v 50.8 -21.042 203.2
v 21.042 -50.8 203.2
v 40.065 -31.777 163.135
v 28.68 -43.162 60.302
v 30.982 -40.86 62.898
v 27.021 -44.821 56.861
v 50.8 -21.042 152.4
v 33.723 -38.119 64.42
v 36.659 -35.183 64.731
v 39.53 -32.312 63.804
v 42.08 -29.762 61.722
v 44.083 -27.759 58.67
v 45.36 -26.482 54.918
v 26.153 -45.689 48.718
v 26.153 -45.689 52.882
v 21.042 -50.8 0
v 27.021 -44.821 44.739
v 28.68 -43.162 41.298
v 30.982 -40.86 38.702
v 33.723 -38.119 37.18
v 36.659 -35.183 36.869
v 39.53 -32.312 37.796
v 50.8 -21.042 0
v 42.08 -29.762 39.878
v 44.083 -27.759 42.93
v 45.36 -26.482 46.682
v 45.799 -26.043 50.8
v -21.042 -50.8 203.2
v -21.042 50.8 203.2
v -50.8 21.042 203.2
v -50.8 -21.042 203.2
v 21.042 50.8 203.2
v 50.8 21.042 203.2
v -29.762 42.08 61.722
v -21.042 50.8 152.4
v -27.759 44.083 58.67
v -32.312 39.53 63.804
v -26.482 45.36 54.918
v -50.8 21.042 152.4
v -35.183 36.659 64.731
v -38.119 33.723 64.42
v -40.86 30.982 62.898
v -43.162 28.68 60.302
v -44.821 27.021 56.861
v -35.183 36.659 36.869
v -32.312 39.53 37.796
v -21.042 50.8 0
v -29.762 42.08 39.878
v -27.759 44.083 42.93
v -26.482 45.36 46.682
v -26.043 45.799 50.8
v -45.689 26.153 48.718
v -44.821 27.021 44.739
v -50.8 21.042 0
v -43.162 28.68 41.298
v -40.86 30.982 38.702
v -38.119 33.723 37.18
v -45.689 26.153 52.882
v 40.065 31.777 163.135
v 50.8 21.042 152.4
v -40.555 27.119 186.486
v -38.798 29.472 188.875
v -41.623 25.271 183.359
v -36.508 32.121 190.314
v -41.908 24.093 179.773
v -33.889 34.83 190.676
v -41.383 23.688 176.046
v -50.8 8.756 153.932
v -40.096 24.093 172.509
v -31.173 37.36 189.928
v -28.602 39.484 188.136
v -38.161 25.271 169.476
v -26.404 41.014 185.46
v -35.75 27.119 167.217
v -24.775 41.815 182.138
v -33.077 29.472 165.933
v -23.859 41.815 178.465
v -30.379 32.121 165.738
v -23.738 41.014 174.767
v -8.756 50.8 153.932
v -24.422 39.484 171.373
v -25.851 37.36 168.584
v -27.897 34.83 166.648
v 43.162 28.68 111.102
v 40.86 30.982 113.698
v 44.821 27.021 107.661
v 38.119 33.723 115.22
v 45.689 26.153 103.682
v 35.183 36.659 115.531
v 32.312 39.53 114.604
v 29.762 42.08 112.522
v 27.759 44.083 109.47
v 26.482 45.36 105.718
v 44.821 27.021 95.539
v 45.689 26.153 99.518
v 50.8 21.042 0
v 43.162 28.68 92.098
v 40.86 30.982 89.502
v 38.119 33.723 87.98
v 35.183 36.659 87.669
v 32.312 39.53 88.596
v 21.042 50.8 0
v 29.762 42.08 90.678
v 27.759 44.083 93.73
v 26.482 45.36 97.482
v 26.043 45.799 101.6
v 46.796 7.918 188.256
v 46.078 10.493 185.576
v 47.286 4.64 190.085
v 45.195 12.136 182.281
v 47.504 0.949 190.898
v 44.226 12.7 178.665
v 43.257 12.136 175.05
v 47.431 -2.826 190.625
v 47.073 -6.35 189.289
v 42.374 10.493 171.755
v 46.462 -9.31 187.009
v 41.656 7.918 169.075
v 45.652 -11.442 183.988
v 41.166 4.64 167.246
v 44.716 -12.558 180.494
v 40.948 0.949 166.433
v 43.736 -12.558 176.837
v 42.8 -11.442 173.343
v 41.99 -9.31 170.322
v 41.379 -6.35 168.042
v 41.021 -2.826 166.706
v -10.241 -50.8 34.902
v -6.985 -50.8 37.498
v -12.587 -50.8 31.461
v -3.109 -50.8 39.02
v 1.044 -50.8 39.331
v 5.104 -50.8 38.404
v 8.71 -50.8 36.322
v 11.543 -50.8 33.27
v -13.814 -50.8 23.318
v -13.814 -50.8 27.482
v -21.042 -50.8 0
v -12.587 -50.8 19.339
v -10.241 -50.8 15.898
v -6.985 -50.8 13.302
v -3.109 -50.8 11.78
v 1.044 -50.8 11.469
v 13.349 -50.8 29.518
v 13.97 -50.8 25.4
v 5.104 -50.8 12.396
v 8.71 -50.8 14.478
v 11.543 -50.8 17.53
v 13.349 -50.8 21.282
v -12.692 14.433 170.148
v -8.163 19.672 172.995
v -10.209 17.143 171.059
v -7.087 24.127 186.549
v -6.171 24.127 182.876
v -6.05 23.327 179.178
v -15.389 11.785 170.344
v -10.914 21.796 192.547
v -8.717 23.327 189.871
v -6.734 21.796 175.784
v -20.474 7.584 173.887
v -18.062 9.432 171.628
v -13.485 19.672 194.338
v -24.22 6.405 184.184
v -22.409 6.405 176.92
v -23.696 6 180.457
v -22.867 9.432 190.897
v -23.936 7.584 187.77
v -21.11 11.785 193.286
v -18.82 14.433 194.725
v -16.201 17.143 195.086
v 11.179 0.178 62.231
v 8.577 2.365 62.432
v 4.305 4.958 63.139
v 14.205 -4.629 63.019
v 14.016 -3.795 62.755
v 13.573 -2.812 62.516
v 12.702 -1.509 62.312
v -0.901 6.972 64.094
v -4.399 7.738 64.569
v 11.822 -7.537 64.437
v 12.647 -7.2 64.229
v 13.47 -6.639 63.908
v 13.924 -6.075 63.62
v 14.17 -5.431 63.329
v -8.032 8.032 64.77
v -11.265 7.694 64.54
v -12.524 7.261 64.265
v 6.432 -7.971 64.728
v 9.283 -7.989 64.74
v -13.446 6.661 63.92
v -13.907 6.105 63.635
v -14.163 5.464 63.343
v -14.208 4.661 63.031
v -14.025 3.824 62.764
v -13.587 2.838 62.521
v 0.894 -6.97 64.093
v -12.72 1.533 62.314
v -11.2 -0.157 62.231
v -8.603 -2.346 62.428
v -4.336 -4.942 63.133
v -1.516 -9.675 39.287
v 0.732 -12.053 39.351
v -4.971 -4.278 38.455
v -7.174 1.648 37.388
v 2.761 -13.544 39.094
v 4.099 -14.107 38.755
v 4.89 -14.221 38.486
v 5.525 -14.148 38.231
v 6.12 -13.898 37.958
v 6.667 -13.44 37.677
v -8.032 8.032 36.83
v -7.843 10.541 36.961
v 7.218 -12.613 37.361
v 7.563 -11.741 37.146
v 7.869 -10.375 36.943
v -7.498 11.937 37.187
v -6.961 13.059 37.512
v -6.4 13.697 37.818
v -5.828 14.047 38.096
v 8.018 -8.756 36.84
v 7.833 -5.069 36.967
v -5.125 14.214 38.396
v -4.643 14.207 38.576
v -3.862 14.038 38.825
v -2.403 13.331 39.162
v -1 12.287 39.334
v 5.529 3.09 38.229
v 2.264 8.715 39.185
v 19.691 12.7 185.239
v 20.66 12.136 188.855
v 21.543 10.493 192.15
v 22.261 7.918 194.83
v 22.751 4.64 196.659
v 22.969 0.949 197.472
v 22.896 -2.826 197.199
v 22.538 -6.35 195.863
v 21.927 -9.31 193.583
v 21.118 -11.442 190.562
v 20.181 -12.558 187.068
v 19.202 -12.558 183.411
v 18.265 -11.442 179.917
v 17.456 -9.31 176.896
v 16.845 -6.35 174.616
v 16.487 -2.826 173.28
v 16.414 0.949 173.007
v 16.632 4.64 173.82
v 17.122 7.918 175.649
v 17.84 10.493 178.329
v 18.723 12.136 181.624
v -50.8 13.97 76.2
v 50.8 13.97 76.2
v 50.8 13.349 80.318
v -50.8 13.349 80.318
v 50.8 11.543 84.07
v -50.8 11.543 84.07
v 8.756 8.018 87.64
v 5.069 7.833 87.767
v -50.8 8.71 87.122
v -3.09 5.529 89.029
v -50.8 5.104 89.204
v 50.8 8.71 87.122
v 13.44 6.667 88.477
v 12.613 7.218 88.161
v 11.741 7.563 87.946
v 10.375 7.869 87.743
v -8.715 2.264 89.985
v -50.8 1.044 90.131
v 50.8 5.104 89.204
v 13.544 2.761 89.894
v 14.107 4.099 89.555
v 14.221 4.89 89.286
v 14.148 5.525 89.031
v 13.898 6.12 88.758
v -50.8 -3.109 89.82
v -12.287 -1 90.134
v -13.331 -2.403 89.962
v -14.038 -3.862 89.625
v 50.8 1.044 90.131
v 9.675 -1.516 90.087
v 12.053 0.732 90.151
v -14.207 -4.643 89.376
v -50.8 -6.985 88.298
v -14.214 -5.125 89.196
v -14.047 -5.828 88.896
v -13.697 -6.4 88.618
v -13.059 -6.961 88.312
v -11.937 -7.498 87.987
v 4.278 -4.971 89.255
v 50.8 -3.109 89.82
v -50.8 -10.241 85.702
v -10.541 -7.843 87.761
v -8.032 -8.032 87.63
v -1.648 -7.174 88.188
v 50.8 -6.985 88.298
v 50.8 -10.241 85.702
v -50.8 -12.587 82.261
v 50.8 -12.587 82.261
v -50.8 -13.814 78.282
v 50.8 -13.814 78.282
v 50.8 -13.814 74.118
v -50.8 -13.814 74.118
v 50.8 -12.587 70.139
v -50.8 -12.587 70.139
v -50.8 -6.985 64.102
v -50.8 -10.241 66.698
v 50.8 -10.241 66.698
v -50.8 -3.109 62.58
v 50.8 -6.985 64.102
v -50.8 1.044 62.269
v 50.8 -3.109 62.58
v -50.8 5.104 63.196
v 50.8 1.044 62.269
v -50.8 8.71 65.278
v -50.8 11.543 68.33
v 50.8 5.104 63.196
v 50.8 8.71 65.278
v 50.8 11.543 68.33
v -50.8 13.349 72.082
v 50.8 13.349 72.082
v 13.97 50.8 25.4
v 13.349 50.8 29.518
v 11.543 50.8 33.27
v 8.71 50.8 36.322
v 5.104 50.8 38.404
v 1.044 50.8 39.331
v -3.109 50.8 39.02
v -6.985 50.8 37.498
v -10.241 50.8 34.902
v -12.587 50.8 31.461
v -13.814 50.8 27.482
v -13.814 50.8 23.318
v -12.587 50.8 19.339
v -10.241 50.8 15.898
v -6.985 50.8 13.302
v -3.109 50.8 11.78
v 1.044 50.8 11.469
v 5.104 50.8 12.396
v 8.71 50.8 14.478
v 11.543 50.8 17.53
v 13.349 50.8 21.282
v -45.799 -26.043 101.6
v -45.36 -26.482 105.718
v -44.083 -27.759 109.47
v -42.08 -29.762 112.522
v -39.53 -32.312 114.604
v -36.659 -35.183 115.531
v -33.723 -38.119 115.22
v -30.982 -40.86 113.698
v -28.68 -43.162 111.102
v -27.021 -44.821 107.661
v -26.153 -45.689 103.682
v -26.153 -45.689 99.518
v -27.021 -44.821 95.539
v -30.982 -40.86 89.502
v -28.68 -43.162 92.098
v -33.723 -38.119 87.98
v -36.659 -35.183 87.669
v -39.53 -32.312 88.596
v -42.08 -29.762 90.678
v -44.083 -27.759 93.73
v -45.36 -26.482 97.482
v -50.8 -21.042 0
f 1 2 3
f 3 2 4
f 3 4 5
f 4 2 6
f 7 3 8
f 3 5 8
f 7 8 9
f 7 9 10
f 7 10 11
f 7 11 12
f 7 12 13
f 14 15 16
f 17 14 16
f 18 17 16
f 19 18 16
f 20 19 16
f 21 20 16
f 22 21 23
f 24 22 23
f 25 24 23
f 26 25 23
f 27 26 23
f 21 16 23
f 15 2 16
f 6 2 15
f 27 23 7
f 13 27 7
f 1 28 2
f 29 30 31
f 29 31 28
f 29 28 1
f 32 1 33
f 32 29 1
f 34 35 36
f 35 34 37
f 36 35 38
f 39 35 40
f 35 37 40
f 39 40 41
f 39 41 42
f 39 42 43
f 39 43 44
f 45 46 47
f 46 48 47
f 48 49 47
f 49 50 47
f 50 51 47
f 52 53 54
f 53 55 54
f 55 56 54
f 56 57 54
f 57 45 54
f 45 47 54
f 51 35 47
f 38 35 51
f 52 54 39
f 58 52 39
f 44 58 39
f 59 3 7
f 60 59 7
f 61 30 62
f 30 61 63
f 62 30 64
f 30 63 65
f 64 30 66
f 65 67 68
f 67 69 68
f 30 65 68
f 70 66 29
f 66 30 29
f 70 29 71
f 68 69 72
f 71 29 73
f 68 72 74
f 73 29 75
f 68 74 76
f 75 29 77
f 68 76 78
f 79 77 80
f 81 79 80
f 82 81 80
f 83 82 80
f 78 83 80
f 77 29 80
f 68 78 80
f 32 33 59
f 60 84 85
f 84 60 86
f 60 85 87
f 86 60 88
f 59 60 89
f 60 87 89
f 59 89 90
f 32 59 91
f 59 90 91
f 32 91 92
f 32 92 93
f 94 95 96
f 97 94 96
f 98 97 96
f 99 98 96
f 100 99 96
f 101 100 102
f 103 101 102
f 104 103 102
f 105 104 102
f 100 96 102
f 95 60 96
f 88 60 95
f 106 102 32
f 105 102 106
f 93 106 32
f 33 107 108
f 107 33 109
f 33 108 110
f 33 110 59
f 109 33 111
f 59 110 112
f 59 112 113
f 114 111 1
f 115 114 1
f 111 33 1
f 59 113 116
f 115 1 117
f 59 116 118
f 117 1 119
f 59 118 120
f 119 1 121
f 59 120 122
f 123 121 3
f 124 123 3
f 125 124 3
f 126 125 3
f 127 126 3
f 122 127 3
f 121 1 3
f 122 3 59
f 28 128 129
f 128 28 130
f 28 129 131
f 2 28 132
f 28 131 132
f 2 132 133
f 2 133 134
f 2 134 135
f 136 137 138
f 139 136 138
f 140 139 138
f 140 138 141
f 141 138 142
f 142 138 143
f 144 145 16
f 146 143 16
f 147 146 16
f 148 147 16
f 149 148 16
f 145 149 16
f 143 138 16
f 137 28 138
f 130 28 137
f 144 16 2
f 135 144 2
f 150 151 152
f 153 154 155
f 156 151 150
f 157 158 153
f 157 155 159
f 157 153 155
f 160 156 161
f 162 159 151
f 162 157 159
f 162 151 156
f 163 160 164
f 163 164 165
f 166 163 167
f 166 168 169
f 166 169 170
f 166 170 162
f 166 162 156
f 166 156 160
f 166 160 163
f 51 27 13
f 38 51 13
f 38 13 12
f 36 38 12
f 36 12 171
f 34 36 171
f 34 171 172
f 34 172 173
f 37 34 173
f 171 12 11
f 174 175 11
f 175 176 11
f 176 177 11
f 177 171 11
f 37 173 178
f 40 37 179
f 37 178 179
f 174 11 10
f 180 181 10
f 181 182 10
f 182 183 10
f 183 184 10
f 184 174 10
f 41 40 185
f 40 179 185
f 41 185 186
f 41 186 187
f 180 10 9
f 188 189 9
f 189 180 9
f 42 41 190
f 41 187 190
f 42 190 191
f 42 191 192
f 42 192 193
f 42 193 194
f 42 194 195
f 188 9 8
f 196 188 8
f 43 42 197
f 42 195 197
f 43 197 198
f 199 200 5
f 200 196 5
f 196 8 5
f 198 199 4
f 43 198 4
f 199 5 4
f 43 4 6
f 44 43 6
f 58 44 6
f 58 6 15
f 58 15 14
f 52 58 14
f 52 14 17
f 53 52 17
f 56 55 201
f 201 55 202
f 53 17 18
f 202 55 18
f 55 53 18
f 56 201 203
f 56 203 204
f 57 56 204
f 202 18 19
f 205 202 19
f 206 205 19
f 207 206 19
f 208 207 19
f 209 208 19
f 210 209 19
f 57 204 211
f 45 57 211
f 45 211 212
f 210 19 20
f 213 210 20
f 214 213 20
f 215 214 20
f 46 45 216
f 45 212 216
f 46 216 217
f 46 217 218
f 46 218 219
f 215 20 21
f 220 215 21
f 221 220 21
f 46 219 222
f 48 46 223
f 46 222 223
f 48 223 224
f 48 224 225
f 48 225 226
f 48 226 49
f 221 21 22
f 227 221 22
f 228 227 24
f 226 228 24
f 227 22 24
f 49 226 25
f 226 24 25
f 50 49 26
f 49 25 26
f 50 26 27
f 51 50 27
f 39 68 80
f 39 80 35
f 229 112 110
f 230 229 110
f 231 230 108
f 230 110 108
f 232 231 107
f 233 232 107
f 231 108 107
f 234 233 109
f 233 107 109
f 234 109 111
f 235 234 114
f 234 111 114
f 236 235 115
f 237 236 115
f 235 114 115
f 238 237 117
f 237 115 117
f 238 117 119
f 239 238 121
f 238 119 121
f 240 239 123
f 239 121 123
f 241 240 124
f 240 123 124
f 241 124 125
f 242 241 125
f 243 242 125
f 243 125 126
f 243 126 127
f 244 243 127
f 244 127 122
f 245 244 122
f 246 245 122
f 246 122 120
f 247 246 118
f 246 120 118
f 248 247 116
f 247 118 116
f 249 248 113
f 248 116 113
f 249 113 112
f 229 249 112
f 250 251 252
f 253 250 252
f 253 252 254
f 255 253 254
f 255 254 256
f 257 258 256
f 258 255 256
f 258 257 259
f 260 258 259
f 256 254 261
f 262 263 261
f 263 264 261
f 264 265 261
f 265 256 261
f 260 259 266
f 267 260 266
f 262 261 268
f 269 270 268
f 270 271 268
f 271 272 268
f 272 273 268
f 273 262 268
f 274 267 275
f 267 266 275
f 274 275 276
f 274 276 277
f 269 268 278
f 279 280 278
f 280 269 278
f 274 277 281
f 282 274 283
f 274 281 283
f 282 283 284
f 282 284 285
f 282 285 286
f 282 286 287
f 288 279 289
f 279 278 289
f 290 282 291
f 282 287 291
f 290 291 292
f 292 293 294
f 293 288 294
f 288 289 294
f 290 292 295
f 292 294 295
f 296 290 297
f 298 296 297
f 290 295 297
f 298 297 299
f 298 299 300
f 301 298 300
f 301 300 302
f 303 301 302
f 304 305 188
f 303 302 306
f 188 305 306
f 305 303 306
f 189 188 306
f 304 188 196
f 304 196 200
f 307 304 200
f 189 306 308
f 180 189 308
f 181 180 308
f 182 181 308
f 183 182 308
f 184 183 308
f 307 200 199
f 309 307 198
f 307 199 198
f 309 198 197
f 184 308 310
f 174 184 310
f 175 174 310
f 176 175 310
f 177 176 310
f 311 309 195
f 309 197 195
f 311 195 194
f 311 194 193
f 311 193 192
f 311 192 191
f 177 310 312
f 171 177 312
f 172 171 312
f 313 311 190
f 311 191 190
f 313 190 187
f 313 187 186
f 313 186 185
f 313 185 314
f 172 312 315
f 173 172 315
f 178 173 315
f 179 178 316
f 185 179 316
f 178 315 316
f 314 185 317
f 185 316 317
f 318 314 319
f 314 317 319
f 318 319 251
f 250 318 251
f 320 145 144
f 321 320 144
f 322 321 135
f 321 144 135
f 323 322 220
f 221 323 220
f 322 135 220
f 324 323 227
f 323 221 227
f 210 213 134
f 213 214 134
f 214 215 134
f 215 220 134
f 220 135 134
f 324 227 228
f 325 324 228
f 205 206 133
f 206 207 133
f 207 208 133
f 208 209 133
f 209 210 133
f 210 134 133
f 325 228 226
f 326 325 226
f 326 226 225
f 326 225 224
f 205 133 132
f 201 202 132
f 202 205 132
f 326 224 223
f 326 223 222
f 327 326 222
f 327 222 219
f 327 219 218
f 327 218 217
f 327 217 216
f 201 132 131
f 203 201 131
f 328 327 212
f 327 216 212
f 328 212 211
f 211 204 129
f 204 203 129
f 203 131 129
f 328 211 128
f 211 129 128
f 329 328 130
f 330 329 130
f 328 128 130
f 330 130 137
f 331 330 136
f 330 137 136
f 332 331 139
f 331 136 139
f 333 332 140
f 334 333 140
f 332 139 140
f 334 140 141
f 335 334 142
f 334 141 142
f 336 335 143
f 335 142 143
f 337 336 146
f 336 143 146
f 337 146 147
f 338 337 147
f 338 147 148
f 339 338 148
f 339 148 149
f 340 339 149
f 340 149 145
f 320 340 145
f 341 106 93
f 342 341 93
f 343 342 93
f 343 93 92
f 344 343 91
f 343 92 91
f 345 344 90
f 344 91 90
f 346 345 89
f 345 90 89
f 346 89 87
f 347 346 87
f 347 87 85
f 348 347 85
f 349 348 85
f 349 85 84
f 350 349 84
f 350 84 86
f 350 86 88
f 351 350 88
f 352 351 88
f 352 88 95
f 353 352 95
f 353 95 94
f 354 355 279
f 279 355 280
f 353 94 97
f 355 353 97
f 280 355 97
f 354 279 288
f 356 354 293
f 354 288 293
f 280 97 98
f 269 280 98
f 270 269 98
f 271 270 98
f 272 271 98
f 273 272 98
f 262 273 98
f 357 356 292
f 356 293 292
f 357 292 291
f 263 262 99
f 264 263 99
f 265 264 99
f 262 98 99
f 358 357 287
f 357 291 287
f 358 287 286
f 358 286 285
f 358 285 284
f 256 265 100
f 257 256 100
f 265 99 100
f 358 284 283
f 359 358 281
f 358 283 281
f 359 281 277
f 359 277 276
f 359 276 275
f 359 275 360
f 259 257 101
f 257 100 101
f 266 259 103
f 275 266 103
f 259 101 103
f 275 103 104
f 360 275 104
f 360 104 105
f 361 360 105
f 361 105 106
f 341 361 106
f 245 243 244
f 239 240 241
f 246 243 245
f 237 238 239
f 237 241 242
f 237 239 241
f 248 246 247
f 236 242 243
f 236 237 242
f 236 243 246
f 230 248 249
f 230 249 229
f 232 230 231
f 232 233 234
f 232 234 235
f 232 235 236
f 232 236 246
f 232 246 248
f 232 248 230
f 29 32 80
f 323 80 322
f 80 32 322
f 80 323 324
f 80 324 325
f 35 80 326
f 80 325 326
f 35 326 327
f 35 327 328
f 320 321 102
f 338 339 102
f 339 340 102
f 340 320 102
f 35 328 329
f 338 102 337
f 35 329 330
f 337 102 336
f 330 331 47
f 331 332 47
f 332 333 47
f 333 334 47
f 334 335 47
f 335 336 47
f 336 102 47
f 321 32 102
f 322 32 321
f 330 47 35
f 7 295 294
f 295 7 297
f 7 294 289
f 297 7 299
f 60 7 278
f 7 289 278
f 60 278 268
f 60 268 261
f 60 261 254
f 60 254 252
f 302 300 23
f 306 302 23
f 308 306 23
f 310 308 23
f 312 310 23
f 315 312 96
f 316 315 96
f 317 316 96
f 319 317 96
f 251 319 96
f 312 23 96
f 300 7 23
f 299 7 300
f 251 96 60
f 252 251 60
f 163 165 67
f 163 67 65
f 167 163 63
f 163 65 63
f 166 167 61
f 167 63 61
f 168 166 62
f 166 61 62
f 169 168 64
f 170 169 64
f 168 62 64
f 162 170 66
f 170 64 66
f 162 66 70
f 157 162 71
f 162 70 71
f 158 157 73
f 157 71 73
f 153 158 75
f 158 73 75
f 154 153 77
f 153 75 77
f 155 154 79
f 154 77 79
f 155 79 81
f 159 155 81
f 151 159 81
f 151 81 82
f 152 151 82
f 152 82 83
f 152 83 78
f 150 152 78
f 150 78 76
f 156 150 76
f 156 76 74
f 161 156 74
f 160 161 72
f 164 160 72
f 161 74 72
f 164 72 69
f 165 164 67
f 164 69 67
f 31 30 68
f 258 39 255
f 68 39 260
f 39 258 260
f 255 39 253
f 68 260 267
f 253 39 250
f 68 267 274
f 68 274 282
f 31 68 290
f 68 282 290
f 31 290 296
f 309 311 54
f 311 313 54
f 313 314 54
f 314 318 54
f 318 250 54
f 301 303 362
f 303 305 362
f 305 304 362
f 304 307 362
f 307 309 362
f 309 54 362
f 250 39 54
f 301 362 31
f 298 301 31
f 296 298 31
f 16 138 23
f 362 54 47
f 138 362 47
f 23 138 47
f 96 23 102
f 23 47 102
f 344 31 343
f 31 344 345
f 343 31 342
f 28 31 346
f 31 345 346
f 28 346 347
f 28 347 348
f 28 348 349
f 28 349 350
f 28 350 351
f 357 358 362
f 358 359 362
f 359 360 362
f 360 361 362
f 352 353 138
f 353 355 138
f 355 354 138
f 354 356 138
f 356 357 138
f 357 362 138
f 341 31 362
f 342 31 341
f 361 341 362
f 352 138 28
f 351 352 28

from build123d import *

# Parameters (mm, degrees)
F1_DEPTH  = 203.2
F2_R      = 13.97
F3_DEPTH  = 101.601
F4_R      = 13.97
F5_DEPTH  = 101.6
F6_R      = 13.97
F7_DEPTH  = 101.601
F8_R      = 13.97
F9_DEPTH  = 122.64304911
F11_DEPTH = 101.6010001
F12_R     = 12.7
F13_DEPTH = 25.4
F15_DEPTH = 122.64304911
F16_R     = 12.7
F17_DEPTH = 25.4


with BuildPart() as f1:
    # F0 (on Top) → F1 (new body)
    with BuildSketch(Plane.XY):
        Polygon((-21.0420489686, -50.8), (21.0420489686, -50.8), (50.8, -21.0420489686), (50.8, 21.0420489686), (21.0420489686, 50.8), (-21.0420489686, 50.8), (-50.8, 21.0420489686), (-50.8, -21.0420489686), align=None)
    extrude(amount=F1_DEPTH)

    # F2 (on face) → F3 (cut, through all)
    with BuildSketch(Plane.XZ.offset(50.8)):
        with Locations((0, 25.4)):
            Circle(F2_R)
    extrude(amount=-F3_DEPTH, mode=Mode.SUBTRACT)

    # F4 (on face) → F5 (cut)
    with BuildSketch(Plane(origin=(35.9210244843, -35.9210244843, 0), x_dir=(0.7071067812, 0.7071067812, 0), z_dir=(0.7071067812, -0.7071067812, 0))):
        with Locations((0, 50.8)):
            Circle(F4_R)
    extrude(amount=-F5_DEPTH, mode=Mode.SUBTRACT)

    # F6 (on face) → F7 (cut, through all)
    with BuildSketch(Plane.YZ.offset(50.8)):
        with Locations((0, 76.2)):
            Circle(F6_R)
    extrude(amount=-F7_DEPTH, mode=Mode.SUBTRACT)

    # F8 (on face) → F9 (cut, through all)
    with BuildSketch(Plane(origin=(35.9210244843, 35.9210244843, 0), x_dir=(-0.7071067812, 0.7071067812, 0), z_dir=(0.7071067812, 0.7071067812, 0))):
        with Locations((0, 101.6)):
            Circle(F8_R)
    extrude(amount=-F9_DEPTH, mode=Mode.SUBTRACT)

    # F10 (on face) → F11 (cut, through all)
    with BuildSketch(Plane.XZ.offset(50.8)):
        Polygon((50.8, 152.4), (50.8, 203.2), (40.0646968374, 163.1353031626), align=None)
    extrude(amount=-F11_DEPTH, mode=Mode.SUBTRACT)

    # F12 (on face) → F13 (cut)
    with BuildSketch(Plane(origin=(-3.4029547439, 0, 0.9118189755), x_dir=(0, 1, 0), z_dir=(0.9659258263, 0, -0.2588190451))):
        with Locations((0, 184.0241353931)):
            Circle(F12_R)
    extrude(amount=-F13_DEPTH, mode=Mode.SUBTRACT)

    # F14 (on face) → F15 (cut, through all)
    with BuildSketch(Plane(origin=(35.9210244843, 35.9210244843, 0), x_dir=(-0.7071067812, 0.7071067812, 0), z_dir=(0.7071067812, 0.7071067812, 0))):
        Polygon((50.8, 152.4), (50.8, 203.2), (42.1126883595, 153.931807432), align=None)
    extrude(amount=-F15_DEPTH, mode=Mode.SUBTRACT)

    # F16 (on face) → F17 (cut)
    with BuildSketch(Plane(origin=(-10.2664451766, 10.2664451766, -2.5600819123), x_dir=(-0.6756735354, -0.717688543, -0.1684886606), z_dir=(-0.6963642403, 0.6963642403, -0.1736481777))):
        with Locations((-31.4004860543, 180.8281922458)):
            Circle(F16_R)
    extrude(amount=-F17_DEPTH, mode=Mode.SUBTRACT)


solid = f1.part
